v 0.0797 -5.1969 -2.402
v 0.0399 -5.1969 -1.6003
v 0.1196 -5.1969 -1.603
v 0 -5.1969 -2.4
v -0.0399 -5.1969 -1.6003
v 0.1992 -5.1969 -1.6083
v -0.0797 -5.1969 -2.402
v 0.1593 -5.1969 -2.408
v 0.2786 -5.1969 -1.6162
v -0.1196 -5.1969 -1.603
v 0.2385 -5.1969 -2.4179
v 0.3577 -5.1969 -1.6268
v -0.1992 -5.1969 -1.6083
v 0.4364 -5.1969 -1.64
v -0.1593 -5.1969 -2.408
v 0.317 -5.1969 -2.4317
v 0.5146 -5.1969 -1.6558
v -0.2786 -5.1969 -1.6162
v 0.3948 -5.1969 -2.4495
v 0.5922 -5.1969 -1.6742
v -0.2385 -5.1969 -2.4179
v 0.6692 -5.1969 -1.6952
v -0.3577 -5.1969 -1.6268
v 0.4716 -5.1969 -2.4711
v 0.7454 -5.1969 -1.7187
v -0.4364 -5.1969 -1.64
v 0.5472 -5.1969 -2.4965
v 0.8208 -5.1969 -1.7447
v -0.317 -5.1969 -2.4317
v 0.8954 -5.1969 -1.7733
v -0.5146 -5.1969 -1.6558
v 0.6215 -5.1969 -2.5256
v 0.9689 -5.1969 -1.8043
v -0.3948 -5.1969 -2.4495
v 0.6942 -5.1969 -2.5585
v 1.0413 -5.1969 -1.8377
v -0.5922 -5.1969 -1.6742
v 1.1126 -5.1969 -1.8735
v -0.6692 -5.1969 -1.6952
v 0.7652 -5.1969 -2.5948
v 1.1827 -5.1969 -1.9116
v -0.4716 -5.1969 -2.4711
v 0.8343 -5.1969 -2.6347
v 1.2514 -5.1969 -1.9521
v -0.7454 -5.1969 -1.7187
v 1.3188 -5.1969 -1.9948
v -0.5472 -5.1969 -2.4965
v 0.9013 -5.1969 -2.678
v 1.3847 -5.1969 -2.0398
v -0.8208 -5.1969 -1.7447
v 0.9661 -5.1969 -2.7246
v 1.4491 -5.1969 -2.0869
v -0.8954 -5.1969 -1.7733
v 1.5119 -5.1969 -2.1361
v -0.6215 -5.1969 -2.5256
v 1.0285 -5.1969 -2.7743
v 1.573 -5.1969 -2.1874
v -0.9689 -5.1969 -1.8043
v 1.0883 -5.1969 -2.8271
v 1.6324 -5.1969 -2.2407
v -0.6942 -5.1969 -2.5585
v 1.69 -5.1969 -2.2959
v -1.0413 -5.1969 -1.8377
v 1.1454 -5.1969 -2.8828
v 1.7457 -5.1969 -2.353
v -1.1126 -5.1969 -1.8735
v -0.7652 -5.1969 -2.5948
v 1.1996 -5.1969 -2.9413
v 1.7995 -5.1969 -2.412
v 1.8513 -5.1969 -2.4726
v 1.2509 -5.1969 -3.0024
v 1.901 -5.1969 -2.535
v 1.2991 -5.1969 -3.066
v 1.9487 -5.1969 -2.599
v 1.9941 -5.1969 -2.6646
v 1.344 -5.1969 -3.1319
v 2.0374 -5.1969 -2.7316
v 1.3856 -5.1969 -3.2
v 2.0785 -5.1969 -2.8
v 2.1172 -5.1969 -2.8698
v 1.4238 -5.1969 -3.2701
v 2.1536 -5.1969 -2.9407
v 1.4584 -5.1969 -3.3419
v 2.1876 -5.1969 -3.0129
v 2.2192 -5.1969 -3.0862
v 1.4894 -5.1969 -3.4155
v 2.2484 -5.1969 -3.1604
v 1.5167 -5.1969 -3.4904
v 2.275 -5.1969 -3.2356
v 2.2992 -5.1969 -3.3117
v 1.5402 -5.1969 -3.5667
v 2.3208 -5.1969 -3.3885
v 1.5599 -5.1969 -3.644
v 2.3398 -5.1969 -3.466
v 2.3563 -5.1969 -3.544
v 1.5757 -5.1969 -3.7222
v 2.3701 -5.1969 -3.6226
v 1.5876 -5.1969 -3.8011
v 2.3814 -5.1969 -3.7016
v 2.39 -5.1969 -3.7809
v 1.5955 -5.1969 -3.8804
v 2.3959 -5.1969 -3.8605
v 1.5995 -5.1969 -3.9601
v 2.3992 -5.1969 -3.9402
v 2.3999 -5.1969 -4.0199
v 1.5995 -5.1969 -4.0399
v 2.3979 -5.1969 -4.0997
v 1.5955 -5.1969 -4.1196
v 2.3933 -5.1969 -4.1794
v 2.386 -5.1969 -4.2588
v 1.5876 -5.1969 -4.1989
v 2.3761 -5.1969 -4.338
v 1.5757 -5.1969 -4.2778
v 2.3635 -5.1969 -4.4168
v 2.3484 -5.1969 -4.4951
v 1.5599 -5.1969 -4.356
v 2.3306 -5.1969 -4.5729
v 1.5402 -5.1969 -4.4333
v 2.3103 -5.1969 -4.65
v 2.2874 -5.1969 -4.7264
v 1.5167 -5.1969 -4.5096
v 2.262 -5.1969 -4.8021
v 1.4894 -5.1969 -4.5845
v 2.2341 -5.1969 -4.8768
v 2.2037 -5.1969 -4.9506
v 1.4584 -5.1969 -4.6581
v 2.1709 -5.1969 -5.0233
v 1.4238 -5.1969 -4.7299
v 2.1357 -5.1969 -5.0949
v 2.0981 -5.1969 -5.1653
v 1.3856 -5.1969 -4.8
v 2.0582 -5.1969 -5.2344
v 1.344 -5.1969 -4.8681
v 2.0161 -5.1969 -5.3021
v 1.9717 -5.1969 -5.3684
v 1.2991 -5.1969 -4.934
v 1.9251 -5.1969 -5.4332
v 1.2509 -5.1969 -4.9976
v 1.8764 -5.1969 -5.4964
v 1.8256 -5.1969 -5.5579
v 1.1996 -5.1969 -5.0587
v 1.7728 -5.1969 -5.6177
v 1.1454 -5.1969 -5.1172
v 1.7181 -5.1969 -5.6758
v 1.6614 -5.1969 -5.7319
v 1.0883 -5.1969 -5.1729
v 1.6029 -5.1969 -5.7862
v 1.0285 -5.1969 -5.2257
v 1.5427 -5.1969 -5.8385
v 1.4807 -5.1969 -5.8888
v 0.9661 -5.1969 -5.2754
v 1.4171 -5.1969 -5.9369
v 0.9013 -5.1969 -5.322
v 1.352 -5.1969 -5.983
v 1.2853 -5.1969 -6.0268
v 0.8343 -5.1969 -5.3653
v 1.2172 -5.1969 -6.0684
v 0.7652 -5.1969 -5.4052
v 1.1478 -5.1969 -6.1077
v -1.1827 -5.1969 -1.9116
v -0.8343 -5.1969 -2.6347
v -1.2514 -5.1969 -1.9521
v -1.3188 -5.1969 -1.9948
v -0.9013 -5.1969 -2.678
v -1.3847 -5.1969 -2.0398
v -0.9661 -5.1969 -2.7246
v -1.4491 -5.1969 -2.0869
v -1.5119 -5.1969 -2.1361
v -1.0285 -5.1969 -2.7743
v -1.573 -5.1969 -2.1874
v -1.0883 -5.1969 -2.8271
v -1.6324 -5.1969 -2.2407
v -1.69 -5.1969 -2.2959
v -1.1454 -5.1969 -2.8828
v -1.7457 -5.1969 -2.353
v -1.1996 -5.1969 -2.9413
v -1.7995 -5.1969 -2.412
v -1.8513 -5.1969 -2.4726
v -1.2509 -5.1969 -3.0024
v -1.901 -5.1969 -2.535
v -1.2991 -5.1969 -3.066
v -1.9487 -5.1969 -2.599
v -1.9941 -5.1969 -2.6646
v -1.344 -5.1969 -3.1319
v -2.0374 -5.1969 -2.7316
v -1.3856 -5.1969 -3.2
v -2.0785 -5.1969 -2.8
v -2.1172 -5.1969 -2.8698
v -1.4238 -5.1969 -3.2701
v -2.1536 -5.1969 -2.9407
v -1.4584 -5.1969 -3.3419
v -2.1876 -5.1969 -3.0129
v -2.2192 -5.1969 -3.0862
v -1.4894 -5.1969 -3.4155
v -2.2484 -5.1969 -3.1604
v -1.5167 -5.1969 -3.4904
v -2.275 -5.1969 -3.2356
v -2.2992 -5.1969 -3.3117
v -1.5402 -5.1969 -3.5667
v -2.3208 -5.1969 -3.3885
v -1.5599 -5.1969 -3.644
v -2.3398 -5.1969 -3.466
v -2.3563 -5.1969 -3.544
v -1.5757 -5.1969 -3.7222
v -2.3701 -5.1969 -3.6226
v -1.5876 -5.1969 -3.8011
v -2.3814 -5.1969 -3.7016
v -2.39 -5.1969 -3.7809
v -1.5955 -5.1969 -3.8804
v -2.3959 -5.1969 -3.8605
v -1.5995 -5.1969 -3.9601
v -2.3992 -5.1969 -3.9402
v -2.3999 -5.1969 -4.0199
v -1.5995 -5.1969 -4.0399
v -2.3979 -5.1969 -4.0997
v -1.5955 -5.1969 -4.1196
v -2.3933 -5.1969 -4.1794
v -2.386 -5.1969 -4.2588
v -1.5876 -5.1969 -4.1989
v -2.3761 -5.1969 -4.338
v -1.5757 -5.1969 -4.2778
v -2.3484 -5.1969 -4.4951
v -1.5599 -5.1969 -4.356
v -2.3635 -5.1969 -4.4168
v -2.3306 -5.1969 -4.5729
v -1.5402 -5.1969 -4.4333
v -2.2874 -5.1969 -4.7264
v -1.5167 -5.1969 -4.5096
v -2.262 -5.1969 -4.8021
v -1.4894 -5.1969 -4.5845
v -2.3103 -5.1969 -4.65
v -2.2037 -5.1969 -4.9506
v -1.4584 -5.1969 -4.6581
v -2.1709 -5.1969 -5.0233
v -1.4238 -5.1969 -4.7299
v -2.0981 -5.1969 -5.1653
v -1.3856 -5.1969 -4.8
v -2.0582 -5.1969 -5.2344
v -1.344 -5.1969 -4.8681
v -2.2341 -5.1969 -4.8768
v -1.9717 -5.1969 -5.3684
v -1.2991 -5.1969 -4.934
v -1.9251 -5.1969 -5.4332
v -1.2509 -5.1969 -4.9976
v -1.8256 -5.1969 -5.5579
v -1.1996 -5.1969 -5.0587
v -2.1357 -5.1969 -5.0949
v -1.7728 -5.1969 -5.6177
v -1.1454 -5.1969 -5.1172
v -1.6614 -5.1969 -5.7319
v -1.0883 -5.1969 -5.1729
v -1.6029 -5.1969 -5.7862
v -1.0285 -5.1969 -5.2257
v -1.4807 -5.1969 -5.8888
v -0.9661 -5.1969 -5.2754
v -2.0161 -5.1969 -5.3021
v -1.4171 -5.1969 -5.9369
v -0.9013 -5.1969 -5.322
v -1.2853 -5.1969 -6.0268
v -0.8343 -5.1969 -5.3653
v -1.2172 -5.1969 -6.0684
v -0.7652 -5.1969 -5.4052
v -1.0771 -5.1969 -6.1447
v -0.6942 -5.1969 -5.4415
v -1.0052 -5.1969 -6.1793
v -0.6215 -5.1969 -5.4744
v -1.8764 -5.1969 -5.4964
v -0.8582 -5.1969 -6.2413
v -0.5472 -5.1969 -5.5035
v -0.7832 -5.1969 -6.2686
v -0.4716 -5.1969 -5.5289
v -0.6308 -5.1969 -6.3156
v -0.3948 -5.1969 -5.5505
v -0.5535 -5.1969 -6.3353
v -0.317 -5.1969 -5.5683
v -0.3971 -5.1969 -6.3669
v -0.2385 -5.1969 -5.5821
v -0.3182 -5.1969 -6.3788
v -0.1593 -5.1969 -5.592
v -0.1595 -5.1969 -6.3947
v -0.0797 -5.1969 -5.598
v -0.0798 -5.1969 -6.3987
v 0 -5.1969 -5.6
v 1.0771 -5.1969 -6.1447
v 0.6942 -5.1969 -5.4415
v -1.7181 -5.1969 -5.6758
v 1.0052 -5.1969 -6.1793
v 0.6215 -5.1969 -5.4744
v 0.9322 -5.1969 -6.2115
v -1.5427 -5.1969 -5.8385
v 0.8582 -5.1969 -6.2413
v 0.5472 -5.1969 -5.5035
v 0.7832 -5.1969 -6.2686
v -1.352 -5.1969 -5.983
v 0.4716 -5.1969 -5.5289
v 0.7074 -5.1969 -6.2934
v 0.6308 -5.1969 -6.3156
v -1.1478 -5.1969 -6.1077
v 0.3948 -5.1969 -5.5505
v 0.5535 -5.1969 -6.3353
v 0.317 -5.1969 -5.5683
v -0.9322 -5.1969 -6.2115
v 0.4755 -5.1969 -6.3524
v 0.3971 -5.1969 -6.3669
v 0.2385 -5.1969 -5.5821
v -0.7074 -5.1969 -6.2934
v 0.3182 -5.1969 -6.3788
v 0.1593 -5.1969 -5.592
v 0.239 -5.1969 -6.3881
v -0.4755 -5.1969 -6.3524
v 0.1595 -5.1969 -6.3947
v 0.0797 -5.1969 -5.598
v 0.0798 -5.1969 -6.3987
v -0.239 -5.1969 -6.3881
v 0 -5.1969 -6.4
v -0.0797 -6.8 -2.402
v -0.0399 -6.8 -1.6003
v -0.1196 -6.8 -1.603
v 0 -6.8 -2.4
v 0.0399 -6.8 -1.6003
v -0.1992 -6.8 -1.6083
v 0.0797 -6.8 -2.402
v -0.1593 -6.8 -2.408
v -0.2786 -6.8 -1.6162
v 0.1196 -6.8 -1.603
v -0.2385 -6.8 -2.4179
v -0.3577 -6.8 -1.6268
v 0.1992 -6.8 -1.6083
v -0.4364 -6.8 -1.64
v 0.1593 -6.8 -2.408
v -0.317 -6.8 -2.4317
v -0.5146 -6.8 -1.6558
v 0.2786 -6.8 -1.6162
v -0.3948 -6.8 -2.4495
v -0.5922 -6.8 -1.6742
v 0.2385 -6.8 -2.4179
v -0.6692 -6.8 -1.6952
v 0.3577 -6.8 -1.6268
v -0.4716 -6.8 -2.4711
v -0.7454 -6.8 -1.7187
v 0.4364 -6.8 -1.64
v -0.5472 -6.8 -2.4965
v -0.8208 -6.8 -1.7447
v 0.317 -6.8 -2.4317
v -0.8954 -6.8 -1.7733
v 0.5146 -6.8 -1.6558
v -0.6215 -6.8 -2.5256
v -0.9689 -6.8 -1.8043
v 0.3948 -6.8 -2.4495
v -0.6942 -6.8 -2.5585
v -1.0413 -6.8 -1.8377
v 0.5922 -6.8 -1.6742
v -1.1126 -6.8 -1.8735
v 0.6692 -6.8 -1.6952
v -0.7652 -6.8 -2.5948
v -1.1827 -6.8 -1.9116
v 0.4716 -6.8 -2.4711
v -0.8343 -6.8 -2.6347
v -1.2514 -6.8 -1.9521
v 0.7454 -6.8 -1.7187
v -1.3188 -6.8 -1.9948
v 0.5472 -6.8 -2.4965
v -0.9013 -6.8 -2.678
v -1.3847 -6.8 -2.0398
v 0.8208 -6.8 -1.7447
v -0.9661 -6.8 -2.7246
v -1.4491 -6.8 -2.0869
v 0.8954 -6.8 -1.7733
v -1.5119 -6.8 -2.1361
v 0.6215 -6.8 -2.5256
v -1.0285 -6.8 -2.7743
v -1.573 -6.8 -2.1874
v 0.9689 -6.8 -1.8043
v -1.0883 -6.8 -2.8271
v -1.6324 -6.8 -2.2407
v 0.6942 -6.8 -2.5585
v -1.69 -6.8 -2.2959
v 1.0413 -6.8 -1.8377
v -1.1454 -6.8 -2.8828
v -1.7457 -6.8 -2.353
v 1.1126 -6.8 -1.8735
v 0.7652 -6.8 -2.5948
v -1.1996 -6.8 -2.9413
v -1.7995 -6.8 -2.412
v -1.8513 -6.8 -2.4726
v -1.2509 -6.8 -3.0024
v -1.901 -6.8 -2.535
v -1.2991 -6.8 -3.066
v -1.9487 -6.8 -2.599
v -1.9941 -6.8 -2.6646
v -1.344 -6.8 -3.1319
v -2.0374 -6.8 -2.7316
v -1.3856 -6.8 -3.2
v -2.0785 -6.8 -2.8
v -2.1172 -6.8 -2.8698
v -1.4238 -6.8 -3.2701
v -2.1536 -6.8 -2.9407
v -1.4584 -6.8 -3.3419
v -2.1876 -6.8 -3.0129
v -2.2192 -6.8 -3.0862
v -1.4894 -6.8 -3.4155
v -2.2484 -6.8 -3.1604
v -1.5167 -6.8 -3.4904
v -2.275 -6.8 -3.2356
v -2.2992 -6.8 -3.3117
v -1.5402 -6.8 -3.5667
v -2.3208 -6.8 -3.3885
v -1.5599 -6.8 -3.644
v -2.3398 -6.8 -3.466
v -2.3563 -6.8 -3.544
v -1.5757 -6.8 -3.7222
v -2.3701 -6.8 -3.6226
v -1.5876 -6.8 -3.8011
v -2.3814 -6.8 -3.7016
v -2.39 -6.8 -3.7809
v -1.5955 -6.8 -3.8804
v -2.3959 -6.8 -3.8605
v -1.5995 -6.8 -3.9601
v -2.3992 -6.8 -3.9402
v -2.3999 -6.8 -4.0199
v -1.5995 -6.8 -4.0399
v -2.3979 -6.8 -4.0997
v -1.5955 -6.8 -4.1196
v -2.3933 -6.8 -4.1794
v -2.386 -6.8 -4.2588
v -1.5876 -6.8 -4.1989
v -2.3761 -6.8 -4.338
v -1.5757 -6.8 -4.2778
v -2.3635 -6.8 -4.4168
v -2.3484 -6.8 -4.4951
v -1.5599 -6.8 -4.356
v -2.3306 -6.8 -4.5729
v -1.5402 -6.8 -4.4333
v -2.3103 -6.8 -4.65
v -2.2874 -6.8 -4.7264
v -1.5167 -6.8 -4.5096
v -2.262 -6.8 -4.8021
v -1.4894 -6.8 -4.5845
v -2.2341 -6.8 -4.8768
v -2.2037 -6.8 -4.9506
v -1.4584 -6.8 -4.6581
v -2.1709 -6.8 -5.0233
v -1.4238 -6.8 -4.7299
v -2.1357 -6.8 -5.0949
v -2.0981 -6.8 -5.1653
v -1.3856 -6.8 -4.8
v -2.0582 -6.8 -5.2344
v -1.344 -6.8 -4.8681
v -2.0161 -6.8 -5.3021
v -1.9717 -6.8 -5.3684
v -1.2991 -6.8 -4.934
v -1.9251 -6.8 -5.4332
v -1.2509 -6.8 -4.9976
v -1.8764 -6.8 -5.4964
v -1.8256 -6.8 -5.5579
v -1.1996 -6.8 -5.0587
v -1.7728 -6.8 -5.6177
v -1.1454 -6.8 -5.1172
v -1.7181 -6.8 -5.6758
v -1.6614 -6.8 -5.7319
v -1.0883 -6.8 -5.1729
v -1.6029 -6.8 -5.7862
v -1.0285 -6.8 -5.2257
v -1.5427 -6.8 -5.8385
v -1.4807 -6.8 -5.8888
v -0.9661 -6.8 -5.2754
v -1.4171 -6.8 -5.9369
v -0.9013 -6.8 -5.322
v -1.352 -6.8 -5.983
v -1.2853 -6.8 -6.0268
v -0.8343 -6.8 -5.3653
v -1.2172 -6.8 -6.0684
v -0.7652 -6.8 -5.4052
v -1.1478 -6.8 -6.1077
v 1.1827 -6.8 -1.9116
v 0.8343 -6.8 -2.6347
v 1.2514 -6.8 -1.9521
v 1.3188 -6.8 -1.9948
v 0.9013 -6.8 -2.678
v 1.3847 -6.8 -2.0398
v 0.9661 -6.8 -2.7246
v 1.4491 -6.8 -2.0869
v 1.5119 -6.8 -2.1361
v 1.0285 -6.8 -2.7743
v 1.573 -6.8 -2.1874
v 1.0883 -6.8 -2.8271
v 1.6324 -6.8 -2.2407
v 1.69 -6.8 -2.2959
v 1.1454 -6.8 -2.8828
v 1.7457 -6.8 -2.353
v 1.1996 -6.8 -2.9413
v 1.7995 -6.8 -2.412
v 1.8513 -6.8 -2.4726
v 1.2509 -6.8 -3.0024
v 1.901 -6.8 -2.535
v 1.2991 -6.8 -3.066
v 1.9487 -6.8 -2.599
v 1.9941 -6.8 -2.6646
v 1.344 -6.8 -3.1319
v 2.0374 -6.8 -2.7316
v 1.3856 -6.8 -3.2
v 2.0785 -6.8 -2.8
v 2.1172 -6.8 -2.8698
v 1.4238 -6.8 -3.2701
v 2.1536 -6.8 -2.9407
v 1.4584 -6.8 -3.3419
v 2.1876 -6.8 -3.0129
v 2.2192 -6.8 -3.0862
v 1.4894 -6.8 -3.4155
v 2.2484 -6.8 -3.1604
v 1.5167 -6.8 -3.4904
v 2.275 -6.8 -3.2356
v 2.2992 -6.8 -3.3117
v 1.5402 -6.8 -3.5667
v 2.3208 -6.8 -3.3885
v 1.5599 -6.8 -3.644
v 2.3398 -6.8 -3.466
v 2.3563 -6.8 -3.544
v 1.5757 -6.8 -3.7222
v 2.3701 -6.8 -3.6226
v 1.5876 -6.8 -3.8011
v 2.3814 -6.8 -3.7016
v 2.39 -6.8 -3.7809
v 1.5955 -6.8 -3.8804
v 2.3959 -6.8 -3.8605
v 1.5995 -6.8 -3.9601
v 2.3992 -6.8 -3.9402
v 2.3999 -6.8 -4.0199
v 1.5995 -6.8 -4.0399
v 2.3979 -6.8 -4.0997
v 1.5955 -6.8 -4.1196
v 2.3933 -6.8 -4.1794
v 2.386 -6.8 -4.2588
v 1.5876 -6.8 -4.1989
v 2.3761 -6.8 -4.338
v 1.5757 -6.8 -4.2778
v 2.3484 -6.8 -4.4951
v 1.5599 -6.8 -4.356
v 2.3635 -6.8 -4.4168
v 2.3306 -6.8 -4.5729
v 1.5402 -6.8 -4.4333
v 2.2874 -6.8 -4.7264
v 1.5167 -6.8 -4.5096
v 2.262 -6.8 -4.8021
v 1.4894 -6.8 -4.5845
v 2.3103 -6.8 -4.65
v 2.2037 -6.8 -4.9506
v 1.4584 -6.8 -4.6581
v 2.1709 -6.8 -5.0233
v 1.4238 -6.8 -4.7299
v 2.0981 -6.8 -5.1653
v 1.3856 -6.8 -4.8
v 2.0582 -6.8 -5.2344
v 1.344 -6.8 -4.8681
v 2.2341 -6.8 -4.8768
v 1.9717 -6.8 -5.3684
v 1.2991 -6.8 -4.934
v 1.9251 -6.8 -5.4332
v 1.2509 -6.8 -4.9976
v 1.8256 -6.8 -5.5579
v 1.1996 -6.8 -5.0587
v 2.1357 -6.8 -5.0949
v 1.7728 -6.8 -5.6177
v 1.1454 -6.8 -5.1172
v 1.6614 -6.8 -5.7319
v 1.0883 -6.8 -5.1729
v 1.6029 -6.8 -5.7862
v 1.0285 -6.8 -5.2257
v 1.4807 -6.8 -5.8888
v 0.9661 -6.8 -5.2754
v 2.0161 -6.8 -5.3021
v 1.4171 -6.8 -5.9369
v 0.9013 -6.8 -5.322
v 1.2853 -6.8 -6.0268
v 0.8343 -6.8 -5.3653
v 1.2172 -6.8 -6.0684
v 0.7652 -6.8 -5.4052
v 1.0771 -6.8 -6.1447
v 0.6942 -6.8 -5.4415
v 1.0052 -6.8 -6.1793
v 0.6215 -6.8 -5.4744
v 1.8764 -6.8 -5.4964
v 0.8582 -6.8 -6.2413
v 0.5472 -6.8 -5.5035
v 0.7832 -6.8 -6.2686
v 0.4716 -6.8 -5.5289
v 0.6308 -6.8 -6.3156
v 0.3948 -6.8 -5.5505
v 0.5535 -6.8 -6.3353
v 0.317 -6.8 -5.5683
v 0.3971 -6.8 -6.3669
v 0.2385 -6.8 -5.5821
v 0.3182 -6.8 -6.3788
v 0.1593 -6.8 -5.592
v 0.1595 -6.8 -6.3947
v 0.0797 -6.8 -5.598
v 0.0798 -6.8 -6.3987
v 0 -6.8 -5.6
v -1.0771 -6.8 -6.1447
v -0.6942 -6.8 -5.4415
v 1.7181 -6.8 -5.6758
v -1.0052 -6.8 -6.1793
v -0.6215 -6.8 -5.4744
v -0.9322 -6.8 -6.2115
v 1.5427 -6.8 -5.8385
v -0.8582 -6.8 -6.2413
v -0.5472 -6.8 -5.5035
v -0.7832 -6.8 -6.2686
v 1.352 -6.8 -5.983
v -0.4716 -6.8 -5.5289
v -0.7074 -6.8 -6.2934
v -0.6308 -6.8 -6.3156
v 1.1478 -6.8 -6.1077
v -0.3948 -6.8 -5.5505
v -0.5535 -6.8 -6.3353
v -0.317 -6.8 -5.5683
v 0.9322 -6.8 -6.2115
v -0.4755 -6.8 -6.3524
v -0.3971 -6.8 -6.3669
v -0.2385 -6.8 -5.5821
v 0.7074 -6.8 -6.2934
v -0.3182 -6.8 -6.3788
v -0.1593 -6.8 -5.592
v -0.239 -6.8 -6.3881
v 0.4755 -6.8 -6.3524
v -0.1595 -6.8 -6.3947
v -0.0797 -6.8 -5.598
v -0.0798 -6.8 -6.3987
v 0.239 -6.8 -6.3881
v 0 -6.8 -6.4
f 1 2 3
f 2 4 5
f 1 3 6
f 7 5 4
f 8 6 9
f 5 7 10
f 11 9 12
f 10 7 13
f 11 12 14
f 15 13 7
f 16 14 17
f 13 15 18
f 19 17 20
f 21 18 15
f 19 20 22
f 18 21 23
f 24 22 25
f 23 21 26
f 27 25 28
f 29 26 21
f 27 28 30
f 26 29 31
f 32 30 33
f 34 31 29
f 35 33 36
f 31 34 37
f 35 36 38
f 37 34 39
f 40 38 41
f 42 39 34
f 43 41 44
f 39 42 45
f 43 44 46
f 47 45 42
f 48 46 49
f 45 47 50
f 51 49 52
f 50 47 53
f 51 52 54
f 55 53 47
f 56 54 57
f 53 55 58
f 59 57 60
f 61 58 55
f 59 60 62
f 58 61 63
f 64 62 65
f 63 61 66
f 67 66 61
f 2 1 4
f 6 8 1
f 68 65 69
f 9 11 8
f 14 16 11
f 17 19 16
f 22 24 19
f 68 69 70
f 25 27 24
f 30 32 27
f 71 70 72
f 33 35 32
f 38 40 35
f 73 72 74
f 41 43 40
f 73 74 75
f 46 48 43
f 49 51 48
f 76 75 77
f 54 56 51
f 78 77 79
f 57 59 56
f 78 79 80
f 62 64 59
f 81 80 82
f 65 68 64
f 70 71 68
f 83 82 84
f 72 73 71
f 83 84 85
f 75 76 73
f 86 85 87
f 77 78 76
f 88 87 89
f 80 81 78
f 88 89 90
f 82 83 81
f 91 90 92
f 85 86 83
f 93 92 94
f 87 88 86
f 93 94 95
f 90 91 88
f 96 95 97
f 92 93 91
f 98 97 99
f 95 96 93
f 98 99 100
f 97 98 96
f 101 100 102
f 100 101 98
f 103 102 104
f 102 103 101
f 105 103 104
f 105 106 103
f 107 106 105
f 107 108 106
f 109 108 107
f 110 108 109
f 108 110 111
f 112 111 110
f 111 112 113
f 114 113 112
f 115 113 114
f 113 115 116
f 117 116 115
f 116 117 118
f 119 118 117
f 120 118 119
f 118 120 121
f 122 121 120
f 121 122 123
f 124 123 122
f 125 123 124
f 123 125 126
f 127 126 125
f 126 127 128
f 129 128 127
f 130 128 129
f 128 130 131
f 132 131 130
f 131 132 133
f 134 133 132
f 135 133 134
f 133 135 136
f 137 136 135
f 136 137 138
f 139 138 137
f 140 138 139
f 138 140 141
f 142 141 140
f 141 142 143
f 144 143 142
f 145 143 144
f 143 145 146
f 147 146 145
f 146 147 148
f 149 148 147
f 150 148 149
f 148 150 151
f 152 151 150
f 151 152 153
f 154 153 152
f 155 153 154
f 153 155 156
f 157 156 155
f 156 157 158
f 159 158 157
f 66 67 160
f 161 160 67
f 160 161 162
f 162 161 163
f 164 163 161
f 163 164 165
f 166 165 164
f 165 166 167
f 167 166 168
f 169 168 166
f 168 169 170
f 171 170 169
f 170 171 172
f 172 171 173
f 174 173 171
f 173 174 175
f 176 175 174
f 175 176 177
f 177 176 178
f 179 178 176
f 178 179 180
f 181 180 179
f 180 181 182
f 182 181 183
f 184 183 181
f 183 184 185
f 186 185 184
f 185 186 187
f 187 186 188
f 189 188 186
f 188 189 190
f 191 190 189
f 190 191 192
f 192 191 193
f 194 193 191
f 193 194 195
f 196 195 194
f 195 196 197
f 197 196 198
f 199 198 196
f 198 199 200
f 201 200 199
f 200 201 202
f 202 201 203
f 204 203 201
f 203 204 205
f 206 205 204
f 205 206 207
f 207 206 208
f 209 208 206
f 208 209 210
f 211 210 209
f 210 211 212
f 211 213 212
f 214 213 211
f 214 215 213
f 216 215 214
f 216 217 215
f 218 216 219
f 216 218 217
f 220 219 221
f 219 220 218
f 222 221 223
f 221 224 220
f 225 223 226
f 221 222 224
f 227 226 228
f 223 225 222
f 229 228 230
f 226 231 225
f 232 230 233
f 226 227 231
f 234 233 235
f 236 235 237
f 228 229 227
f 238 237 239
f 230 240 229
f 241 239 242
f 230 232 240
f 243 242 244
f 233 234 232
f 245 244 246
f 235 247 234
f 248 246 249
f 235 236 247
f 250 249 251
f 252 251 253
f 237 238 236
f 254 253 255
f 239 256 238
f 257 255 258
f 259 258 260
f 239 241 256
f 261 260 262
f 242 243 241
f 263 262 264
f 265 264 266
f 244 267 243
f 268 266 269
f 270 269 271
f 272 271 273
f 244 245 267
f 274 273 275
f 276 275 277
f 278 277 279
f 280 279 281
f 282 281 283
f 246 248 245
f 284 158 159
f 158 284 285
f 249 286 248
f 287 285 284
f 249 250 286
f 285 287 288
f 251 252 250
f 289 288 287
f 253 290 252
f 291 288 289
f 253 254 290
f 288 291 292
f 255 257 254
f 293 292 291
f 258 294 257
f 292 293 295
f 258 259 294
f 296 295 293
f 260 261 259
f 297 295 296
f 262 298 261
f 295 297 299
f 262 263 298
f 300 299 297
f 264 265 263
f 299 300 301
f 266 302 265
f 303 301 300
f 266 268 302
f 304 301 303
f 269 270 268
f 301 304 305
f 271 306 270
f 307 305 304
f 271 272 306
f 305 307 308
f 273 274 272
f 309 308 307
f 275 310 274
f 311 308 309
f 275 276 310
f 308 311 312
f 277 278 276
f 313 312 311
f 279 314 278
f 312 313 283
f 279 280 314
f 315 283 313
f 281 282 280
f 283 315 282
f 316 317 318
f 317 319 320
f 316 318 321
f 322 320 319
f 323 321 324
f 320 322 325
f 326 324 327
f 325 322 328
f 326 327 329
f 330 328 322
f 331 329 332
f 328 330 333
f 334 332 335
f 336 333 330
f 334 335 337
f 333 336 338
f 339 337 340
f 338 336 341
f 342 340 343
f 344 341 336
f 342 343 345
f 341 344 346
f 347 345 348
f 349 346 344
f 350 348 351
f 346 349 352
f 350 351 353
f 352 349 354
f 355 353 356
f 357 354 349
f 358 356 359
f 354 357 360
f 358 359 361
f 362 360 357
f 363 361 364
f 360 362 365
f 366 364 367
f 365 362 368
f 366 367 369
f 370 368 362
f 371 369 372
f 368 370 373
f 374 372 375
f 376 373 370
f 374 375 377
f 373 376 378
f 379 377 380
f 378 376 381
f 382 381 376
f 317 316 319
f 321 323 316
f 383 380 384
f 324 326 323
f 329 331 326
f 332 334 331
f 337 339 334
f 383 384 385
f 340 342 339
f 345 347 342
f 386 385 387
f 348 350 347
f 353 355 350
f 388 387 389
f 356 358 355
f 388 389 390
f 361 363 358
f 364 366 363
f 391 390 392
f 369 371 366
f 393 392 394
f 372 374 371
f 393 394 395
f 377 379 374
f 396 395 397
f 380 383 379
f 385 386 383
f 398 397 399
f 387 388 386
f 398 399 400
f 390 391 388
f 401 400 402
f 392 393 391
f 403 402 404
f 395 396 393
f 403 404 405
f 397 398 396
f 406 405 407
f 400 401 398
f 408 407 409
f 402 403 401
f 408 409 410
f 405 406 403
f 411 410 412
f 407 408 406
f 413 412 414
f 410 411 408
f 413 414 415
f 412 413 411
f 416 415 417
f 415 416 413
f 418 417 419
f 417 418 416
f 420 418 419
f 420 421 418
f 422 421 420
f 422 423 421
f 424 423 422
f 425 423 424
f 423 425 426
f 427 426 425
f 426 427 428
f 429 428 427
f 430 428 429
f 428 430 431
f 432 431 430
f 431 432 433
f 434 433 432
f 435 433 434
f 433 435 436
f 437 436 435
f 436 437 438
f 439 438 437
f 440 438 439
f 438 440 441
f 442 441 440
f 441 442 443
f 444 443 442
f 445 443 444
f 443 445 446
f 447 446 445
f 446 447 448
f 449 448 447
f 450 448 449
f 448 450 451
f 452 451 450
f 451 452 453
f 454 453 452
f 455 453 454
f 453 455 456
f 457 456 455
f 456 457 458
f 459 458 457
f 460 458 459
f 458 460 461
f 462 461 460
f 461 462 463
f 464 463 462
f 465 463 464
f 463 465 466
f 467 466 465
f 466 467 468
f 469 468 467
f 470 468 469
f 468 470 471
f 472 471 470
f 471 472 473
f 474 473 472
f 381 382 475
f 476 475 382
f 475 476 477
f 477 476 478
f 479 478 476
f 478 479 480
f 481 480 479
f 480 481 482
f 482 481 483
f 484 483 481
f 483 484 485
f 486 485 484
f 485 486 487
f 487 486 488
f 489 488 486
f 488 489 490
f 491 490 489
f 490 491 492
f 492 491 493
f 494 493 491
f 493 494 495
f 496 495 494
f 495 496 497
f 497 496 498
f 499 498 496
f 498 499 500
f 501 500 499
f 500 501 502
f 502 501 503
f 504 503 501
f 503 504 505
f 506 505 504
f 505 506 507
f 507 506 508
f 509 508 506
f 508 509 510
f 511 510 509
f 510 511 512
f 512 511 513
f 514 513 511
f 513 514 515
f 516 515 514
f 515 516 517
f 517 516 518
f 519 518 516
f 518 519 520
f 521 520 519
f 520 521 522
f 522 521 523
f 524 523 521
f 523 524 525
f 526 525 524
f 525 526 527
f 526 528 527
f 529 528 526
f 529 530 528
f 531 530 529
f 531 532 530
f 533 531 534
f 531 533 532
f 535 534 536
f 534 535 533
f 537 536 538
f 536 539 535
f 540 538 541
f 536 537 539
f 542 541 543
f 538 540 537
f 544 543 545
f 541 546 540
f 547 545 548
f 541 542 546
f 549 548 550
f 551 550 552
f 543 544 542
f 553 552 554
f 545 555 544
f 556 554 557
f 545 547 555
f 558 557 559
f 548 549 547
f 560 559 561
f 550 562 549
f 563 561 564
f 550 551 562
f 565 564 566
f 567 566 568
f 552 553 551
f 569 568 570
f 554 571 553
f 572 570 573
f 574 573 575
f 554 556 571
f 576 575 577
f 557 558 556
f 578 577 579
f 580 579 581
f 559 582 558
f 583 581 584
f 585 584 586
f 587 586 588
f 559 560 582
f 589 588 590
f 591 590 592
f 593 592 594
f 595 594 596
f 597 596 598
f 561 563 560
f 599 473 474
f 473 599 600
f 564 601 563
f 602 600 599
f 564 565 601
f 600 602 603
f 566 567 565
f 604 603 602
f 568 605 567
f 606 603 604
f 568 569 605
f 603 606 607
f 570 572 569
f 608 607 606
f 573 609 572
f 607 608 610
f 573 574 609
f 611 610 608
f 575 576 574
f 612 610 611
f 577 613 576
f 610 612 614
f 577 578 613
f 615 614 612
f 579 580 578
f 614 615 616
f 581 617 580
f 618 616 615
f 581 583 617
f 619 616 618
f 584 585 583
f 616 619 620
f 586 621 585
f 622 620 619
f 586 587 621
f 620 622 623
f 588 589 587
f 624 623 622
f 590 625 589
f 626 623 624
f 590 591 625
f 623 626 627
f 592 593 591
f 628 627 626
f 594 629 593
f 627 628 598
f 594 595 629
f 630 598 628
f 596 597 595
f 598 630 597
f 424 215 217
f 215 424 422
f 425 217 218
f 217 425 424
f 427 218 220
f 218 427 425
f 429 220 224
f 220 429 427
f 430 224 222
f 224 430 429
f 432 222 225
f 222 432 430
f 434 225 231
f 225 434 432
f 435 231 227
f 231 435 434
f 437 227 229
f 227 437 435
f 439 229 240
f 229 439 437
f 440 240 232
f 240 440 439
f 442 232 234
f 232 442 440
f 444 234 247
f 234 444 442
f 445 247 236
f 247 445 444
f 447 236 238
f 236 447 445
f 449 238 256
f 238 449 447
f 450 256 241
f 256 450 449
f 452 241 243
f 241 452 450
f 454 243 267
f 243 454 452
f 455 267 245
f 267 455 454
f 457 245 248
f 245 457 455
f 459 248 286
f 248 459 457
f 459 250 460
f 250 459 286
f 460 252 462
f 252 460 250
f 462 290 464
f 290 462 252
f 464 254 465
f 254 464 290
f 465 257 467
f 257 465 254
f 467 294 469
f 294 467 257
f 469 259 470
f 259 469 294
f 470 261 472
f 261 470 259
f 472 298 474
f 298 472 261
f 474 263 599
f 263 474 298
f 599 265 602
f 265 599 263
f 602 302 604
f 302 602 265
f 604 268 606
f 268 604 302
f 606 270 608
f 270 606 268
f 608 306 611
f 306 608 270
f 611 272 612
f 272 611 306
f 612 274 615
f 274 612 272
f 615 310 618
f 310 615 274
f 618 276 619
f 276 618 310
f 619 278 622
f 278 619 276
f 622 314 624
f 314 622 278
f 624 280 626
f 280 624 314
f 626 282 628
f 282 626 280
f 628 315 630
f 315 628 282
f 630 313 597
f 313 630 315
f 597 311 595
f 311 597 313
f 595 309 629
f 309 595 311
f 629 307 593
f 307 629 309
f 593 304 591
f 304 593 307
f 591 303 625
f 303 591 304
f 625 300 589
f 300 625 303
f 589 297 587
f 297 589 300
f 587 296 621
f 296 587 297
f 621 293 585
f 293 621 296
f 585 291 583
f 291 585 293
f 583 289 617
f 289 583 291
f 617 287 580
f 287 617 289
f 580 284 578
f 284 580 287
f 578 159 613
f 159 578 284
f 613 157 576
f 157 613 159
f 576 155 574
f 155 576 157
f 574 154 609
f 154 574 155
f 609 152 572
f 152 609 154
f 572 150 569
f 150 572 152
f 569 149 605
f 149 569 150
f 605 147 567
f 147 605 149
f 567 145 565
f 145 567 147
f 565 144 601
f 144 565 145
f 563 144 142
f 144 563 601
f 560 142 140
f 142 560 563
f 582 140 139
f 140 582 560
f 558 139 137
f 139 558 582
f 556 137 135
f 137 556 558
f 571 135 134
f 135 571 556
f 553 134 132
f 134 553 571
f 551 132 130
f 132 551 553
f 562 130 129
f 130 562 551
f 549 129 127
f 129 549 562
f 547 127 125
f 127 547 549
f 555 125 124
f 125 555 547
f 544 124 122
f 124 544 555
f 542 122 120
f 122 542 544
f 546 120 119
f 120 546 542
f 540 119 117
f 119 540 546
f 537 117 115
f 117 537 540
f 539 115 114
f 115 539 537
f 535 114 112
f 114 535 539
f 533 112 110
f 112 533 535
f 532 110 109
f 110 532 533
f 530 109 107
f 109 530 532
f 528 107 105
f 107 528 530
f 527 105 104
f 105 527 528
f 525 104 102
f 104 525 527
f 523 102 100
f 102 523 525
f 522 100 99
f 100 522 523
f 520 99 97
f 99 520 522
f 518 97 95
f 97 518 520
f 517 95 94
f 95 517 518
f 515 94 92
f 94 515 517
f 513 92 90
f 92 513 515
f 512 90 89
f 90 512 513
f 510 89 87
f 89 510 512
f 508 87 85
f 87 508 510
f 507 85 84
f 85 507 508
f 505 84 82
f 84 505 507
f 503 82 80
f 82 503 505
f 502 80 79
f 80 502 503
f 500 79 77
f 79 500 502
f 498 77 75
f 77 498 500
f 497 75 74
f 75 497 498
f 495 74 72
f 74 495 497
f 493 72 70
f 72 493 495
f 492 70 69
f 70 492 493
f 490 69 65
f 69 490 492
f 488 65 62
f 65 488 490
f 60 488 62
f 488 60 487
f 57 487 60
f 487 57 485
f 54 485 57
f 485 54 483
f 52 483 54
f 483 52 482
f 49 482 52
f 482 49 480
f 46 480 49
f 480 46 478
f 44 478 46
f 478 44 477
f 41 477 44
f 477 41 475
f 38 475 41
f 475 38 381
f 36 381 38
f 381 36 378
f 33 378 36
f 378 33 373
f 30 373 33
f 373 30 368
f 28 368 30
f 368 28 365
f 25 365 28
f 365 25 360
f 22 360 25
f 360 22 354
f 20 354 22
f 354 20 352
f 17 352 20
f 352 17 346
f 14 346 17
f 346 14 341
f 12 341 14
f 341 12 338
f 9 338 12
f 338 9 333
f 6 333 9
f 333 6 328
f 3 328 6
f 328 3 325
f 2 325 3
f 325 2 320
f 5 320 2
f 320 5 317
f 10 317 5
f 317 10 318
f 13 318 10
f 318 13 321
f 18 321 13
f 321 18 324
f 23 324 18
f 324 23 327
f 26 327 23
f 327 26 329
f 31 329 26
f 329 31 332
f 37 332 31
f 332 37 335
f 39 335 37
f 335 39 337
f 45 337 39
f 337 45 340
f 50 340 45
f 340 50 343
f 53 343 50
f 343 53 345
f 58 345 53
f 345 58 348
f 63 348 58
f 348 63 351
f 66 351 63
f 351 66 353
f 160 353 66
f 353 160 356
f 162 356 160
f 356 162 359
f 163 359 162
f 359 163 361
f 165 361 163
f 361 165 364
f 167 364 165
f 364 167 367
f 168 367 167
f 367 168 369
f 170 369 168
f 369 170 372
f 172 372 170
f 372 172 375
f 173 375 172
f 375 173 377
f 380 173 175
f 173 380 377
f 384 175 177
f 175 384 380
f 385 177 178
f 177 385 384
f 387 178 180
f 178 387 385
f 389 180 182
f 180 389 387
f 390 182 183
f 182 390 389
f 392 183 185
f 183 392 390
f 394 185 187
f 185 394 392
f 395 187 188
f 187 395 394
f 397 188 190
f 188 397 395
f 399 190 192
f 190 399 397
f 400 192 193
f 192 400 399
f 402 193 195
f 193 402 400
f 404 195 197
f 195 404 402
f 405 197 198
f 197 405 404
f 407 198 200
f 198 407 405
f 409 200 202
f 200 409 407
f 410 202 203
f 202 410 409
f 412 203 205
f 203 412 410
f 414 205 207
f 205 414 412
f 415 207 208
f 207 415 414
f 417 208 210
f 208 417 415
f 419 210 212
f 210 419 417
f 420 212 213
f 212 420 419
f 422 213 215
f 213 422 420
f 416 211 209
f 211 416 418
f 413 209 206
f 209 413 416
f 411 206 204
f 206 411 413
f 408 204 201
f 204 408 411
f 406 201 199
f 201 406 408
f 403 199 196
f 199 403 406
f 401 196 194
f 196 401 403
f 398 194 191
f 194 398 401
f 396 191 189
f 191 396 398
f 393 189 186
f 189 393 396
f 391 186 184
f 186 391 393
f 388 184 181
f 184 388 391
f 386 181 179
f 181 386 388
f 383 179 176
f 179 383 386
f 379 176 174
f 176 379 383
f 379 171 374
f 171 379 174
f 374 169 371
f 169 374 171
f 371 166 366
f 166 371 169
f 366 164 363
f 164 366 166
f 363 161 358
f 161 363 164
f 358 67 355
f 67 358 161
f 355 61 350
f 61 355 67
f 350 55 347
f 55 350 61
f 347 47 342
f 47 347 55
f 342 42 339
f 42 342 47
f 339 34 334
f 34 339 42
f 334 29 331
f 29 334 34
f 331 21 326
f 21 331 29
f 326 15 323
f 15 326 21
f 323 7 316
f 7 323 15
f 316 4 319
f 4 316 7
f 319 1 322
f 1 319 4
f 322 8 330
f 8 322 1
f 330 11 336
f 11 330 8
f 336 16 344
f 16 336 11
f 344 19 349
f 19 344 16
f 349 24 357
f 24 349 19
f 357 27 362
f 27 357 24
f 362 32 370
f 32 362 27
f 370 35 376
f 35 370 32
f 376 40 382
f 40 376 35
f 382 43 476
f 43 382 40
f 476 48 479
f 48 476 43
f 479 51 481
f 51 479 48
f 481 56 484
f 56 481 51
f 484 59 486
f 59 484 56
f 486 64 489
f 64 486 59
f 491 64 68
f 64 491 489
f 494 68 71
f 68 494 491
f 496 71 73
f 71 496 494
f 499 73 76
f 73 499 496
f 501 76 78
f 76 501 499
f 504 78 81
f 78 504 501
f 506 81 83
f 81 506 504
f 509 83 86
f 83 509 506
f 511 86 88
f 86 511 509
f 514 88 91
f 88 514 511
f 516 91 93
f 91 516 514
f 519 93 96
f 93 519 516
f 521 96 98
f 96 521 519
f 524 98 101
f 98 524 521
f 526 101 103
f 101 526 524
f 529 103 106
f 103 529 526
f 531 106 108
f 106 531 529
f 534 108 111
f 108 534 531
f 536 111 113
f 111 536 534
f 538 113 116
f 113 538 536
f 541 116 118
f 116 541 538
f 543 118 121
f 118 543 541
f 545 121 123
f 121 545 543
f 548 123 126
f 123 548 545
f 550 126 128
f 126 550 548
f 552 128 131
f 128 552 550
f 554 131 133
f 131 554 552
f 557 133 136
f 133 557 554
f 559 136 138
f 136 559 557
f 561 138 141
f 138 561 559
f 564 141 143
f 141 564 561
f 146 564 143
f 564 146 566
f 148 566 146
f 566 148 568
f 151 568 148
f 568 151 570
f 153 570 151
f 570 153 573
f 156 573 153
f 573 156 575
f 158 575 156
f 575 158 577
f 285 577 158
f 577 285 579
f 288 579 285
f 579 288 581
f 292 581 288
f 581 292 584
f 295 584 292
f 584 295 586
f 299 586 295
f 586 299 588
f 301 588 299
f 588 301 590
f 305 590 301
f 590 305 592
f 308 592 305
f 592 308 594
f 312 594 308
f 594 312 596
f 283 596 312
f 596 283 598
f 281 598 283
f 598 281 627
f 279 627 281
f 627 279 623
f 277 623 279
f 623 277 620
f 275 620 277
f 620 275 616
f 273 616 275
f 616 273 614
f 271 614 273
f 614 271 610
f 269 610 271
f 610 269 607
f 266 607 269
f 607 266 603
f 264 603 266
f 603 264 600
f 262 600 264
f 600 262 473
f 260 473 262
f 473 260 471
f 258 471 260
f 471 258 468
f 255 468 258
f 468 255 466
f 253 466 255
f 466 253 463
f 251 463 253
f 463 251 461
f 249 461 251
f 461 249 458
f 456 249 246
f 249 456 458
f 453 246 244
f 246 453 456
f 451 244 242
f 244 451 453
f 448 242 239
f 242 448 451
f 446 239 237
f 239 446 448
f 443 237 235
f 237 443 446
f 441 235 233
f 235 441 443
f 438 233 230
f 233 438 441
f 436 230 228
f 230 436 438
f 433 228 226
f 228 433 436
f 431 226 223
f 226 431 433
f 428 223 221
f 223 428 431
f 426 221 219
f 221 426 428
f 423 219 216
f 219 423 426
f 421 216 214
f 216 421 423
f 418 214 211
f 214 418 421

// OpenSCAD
use <../lib.scad>
use <../p/1-4cyli.scad>
use <../p/1-4disc.scad>
use <../p/1-4edge.scad>
use <../p/4-4cyli.scad>
use <../p/4-4edge.scad>
use <../p/4-4ndis.scad>
use <../p/stud2.scad>
$fa=1; $fs=0.2;
function ldraw_lib__42446(realsolid=false) = [
// 0 Bracket  1 x  1 -  1 x  1 Thin with Stud Hole
// 0 Name: 42446.dat
// 0 Author: Steve Bliss [sbliss]
// 0 !LDRAW_ORG Part UPDATE 2019-02
// 0 !LICENSE Licensed under CC BY 2.0 and CC BY 4.0 : see CAreadme.txt
// 
// 0 BFC CERTIFY CCW
  [0,"BFC","CERTIFY"],
  [0,"BFC","CCW"],
// 
// 0 !KEYWORDS Minifig Neckwear
// 
// 0 !HISTORY 2005-12-28 [PTadmin] Official Update 2005-01
// 0 !HISTORY 2007-07-04 [PTadmin] Header formatted for Contributor Agreement
// 0 !HISTORY 2008-07-01 [PTadmin] Official Update 2008-01
// 0 !HISTORY 2018-12-16 [cwdee] Update description
// 0 !HISTORY 2019-06-28 [PTadmin] Official Update 2019-01
// 0 !HISTORY 2019-09-02 [cwdee] Add thin to title
// 0 !HISTORY 2019-09-09 [PTadmin] Official Update 2019-02
// 
// 
// 1 16 0 10 -13 1 0 0 0 0 -1 0 1 0 stud2.dat
  [1,16,0,10,-13,1,0,0,0,0,-1,0,1,0, ldraw_lib__stud2(realsolid)],
// 
// 0 BFC INVERTNEXT
  [0,"BFC","INVERTNEXT"],
// 1 16 0 -3 0 6 0 0 0 3 0 0 0 6 4-4cyli.dat
  [1,16,0,-3,0,6,0,0,0,3,0,0,0,6, ldraw_lib__4_4cyli(realsolid)],
// 1 16 0 -3 0 6 0 0 0 1 0 0 0 6 4-4ndis.dat
  [1,16,0,-3,0,6,0,0,0,1,0,0,0,6, ldraw_lib__4_4ndis(realsolid)],
// 1 16 0 0 0 -6 0 0 0 -1 0 0 0 6 4-4ndis.dat
  [1,16,0,0,0,-6,0,0,0,-1,0,0,0,6, ldraw_lib__4_4ndis(realsolid)],
// 
// 1 16 -8 22 -10 0 0 -2 2 0 0 0 -1 0 1-4disc.dat
  [1,16,-8,22,-10,0,0,-2,2,0,0,0,-1,0, ldraw_lib__1_4disc(realsolid)],
// 1 16 8 22 -13 0 0 2 2 0 0 0 1 0 1-4disc.dat
  [1,16,8,22,-13,0,0,2,2,0,0,0,1,0, ldraw_lib__1_4disc(realsolid)],
// 1 16 8 22 -10 2 0 0 0 0 2 0 -1 0 1-4disc.dat
  [1,16,8,22,-10,2,0,0,0,0,2,0,-1,0, ldraw_lib__1_4disc(realsolid)],
// 1 16 -8 22 -13 -2 0 0 0 0 2 0 1 0 1-4disc.dat
  [1,16,-8,22,-13,-2,0,0,0,0,2,0,1,0, ldraw_lib__1_4disc(realsolid)],
// 
// 1 16 8 -3 8 2 0 0 0 1 0 0 0 2 1-4disc.dat
  [1,16,8,-3,8,2,0,0,0,1,0,0,0,2, ldraw_lib__1_4disc(realsolid)],
// 1 16 -8 -3 8 0 0 -2 0 1 0 2 0 0 1-4disc.dat
  [1,16,-8,-3,8,0,0,-2,0,1,0,2,0,0, ldraw_lib__1_4disc(realsolid)],
// 1 16 -8 0 8 -2 0 0 0 -1 0 0 0 2 1-4disc.dat
  [1,16,-8,0,8,-2,0,0,0,-1,0,0,0,2, ldraw_lib__1_4disc(realsolid)],
// 1 16 8 0 8 0 0 2 0 -1 0 2 0 0 1-4disc.dat
  [1,16,8,0,8,0,0,2,0,-1,0,2,0,0, ldraw_lib__1_4disc(realsolid)],
// 
// 1 16 -8 22 -10 0 0 -2 2 0 0 0 -3 0 1-4cyli.dat
  [1,16,-8,22,-10,0,0,-2,2,0,0,0,-3,0, ldraw_lib__1_4cyli(realsolid)],
// 4 16 -10 22 -13 -10 -3 -13 -10 0 -10 -10 22 -10
  [4,16,-10,22,-13,-10,-3,-13,-10,0,-10,-10,22,-10],
// 4 16 -10 -3 -13 -10 -3 8 -10 0 8 -10 0 -10
  [4,16,-10,-3,-13,-10,-3,8,-10,0,8,-10,0,-10],
// 1 16 -8 -3 8 0 0 -2 0 3 0 2 0 0 1-4cyli.dat
  [1,16,-8,-3,8,0,0,-2,0,3,0,2,0,0, ldraw_lib__1_4cyli(realsolid)],
// 4 16 8 -3 10 8 0 10 -8 0 10 -8 -3 10
  [4,16,8,-3,10,8,0,10,-8,0,10,-8,-3,10],
// 1 16 8 -3 8 2 0 0 0 3 0 0 0 2 1-4cyli.dat
  [1,16,8,-3,8,2,0,0,0,3,0,0,0,2, ldraw_lib__1_4cyli(realsolid)],
// 4 16 10 -3 8 10 -3 -13 10 0 -10 10 0 8
  [4,16,10,-3,8,10,-3,-13,10,0,-10,10,0,8],
// 4 16 10 22 -13 10 22 -10 10 0 -10 10 -3 -13
  [4,16,10,22,-13,10,22,-10,10,0,-10,10,-3,-13],
// 1 16 8 22 -10 2 0 0 0 0 2 0 -3 0 1-4cyli.dat
  [1,16,8,22,-10,2,0,0,0,0,2,0,-3,0, ldraw_lib__1_4cyli(realsolid)],
// 4 16 8 24 -10 8 24 -13 -8 24 -13 -8 24 -10
  [4,16,8,24,-10,8,24,-13,-8,24,-13,-8,24,-10],
// 
// 3 16 -10 0 -10 -8 22 -10 -10 22 -10
  [3,16,-10,0,-10,-8,22,-10,-10,22,-10],
// 4 16 -10 0 -10 10 0 -10 8 22 -10 -8 22 -10
  [4,16,-10,0,-10,10,0,-10,8,22,-10,-8,22,-10],
// 3 16 10 0 -10 10 22 -10 8 22 -10
  [3,16,10,0,-10,10,22,-10,8,22,-10],
// 4 16 8 22 -10 8 24 -10 -8 24 -10 -8 22 -10
  [4,16,8,22,-10,8,24,-10,-8,24,-10,-8,22,-10],
// 
// 3 16 10 -3 -13 8 22 -13 10 22 -13
  [3,16,10,-3,-13,8,22,-13,10,22,-13],
// 4 16 10 -3 -13 -10 -3 -13 -8 22 -13 8 22 -13
  [4,16,10,-3,-13,-10,-3,-13,-8,22,-13,8,22,-13],
// 3 16 -10 -3 -13 -10 22 -13 -8 22 -13
  [3,16,-10,-3,-13,-10,22,-13,-8,22,-13],
// 4 16 -8 22 -13 -8 24 -13 8 24 -13 8 22 -13
  [4,16,-8,22,-13,-8,24,-13,8,24,-13,8,22,-13],
// 
// 4 16 -10 0 -10 -10 0 8 -6 0 6 -6 0 -6
  [4,16,-10,0,-10,-10,0,8,-6,0,6,-6,0,-6],
// 3 16 -6 0 6 -10 0 8 -8 0 8
  [3,16,-6,0,6,-10,0,8,-8,0,8],
// 4 16 -6 0 6 -8 0 8 8 0 8 6 0 6
  [4,16,-6,0,6,-8,0,8,8,0,8,6,0,6],
// 4 16 -8 0 8 -8 0 10 8 0 10 8 0 8
  [4,16,-8,0,8,-8,0,10,8,0,10,8,0,8],
// 3 16 6 0 6 8 0 8 10 0 8
  [3,16,6,0,6,8,0,8,10,0,8],
// 4 16 6 0 -6 6 0 6 10 0 8 10 0 -10
  [4,16,6,0,-6,6,0,6,10,0,8,10,0,-10],
// 4 16 -6 0 -6 6 0 -6 10 0 -10 -10 0 -10
  [4,16,-6,0,-6,6,0,-6,10,0,-10,-10,0,-10],
// 
// 4 16 10 -3 -13 10 -3 8 6 -3 6 6 -3 -6
  [4,16,10,-3,-13,10,-3,8,6,-3,6,6,-3,-6],
// 3 16 6 -3 6 10 -3 8 8 -3 8
  [3,16,6,-3,6,10,-3,8,8,-3,8],
// 4 16 6 -3 6 8 -3 8 -8 -3 8 -6 -3 6
  [4,16,6,-3,6,8,-3,8,-8,-3,8,-6,-3,6],
// 4 16 8 -3 8 8 -3 10 -8 -3 10 -8 -3 8
  [4,16,8,-3,8,8,-3,10,-8,-3,10,-8,-3,8],
// 3 16 -6 -3 6 -8 -3 8 -10 -3 8
  [3,16,-6,-3,6,-8,-3,8,-10,-3,8],
// 4 16 -6 -3 -6 -6 -3 6 -10 -3 8 -10 -3 -13
  [4,16,-6,-3,-6,-6,-3,6,-10,-3,8,-10,-3,-13],
// 4 16 6 -3 -6 -6 -3 -6 -10 -3 -13 10 -3 -13
  [4,16,6,-3,-6,-6,-3,-6,-10,-3,-13,10,-3,-13],
// 
// 0 Outlines
// 2 24 10 22 -13 10 -3 -13
  [2,24,10,22,-13,10,-3,-13],
// 2 24 10 -3 -13 10 -3 8
  [2,24,10,-3,-13,10,-3,8],
// 2 24 8 -3 10 -8 -3 10
  [2,24,8,-3,10,-8,-3,10],
// 2 24 -10 -3 8 -10 -3 -13
  [2,24,-10,-3,8,-10,-3,-13],
// 2 24 -10 -3 -13 -10 22 -13
  [2,24,-10,-3,-13,-10,22,-13],
// 2 24 -8 24 -13 8 24 -13
  [2,24,-8,24,-13,8,24,-13],
// 
// 2 24 10 22 -10 10 0 -10
  [2,24,10,22,-10,10,0,-10],
// 2 24 10 0 -10 10 0 8
  [2,24,10,0,-10,10,0,8],
// 2 24 8 0 10 -8 0 10
  [2,24,8,0,10,-8,0,10],
// 2 24 -10 0 8 -10 0 -10
  [2,24,-10,0,8,-10,0,-10],
// 2 24 -10 0 -10 -10 22 -10
  [2,24,-10,0,-10,-10,22,-10],
// 2 24 -8 24 -10 8 24 -10
  [2,24,-8,24,-10,8,24,-10],
// 
// 2 24 -10 -3 -13 10 -3 -13
  [2,24,-10,-3,-13,10,-3,-13],
// 2 24 -10 0 -10 10 0 -10
  [2,24,-10,0,-10,10,0,-10],
// 
// 1 16 -8 22 -10 0 0 -2 2 0 0 0 -1 0 1-4edge.dat
  [1,16,-8,22,-10,0,0,-2,2,0,0,0,-1,0, ldraw_lib__1_4edge(realsolid)],
// 1 16 -8 22 -13 0 0 -2 2 0 0 0 -1 0 1-4edge.dat
  [1,16,-8,22,-13,0,0,-2,2,0,0,0,-1,0, ldraw_lib__1_4edge(realsolid)],
// 1 16 8 22 -10 2 0 0 0 0 2 0 -1 0 1-4edge.dat
  [1,16,8,22,-10,2,0,0,0,0,2,0,-1,0, ldraw_lib__1_4edge(realsolid)],
// 1 16 8 22 -13 2 0 0 0 0 2 0 -1 0 1-4edge.dat
  [1,16,8,22,-13,2,0,0,0,0,2,0,-1,0, ldraw_lib__1_4edge(realsolid)],
// 
// 1 16 8 -3 8 2 0 0 0 1 0 0 0 2 1-4edge.dat
  [1,16,8,-3,8,2,0,0,0,1,0,0,0,2, ldraw_lib__1_4edge(realsolid)],
// 1 16 -8 -3 8 0 0 -2 0 1 0 2 0 0 1-4edge.dat
  [1,16,-8,-3,8,0,0,-2,0,1,0,2,0,0, ldraw_lib__1_4edge(realsolid)],
// 1 16 8 0 8 2 0 0 0 1 0 0 0 2 1-4edge.dat
  [1,16,8,0,8,2,0,0,0,1,0,0,0,2, ldraw_lib__1_4edge(realsolid)],
// 1 16 -8 0 8 0 0 -2 0 1 0 2 0 0 1-4edge.dat
  [1,16,-8,0,8,0,0,-2,0,1,0,2,0,0, ldraw_lib__1_4edge(realsolid)],
// 
// 1 16 0 -3 0 6 0 0 0 1 0 0 0 6 4-4edge.dat
  [1,16,0,-3,0,6,0,0,0,1,0,0,0,6, ldraw_lib__4_4edge(realsolid)],
// 1 16 0 0 0 6 0 0 0 1 0 0 0 6 4-4edge.dat
  [1,16,0,0,0,6,0,0,0,1,0,0,0,6, ldraw_lib__4_4edge(realsolid)],
// 0
// 
];
module ldraw_lib__42446(step=0, col=false, unit=2/5, alt=false, line=0.2, solid=!$preview)
    makepoly(ldraw_lib__42446(solid), step=step, col=col, unit=unit, alt=alt, line=line, solid=solid);
ldraw_lib__42446(line=0.2);
